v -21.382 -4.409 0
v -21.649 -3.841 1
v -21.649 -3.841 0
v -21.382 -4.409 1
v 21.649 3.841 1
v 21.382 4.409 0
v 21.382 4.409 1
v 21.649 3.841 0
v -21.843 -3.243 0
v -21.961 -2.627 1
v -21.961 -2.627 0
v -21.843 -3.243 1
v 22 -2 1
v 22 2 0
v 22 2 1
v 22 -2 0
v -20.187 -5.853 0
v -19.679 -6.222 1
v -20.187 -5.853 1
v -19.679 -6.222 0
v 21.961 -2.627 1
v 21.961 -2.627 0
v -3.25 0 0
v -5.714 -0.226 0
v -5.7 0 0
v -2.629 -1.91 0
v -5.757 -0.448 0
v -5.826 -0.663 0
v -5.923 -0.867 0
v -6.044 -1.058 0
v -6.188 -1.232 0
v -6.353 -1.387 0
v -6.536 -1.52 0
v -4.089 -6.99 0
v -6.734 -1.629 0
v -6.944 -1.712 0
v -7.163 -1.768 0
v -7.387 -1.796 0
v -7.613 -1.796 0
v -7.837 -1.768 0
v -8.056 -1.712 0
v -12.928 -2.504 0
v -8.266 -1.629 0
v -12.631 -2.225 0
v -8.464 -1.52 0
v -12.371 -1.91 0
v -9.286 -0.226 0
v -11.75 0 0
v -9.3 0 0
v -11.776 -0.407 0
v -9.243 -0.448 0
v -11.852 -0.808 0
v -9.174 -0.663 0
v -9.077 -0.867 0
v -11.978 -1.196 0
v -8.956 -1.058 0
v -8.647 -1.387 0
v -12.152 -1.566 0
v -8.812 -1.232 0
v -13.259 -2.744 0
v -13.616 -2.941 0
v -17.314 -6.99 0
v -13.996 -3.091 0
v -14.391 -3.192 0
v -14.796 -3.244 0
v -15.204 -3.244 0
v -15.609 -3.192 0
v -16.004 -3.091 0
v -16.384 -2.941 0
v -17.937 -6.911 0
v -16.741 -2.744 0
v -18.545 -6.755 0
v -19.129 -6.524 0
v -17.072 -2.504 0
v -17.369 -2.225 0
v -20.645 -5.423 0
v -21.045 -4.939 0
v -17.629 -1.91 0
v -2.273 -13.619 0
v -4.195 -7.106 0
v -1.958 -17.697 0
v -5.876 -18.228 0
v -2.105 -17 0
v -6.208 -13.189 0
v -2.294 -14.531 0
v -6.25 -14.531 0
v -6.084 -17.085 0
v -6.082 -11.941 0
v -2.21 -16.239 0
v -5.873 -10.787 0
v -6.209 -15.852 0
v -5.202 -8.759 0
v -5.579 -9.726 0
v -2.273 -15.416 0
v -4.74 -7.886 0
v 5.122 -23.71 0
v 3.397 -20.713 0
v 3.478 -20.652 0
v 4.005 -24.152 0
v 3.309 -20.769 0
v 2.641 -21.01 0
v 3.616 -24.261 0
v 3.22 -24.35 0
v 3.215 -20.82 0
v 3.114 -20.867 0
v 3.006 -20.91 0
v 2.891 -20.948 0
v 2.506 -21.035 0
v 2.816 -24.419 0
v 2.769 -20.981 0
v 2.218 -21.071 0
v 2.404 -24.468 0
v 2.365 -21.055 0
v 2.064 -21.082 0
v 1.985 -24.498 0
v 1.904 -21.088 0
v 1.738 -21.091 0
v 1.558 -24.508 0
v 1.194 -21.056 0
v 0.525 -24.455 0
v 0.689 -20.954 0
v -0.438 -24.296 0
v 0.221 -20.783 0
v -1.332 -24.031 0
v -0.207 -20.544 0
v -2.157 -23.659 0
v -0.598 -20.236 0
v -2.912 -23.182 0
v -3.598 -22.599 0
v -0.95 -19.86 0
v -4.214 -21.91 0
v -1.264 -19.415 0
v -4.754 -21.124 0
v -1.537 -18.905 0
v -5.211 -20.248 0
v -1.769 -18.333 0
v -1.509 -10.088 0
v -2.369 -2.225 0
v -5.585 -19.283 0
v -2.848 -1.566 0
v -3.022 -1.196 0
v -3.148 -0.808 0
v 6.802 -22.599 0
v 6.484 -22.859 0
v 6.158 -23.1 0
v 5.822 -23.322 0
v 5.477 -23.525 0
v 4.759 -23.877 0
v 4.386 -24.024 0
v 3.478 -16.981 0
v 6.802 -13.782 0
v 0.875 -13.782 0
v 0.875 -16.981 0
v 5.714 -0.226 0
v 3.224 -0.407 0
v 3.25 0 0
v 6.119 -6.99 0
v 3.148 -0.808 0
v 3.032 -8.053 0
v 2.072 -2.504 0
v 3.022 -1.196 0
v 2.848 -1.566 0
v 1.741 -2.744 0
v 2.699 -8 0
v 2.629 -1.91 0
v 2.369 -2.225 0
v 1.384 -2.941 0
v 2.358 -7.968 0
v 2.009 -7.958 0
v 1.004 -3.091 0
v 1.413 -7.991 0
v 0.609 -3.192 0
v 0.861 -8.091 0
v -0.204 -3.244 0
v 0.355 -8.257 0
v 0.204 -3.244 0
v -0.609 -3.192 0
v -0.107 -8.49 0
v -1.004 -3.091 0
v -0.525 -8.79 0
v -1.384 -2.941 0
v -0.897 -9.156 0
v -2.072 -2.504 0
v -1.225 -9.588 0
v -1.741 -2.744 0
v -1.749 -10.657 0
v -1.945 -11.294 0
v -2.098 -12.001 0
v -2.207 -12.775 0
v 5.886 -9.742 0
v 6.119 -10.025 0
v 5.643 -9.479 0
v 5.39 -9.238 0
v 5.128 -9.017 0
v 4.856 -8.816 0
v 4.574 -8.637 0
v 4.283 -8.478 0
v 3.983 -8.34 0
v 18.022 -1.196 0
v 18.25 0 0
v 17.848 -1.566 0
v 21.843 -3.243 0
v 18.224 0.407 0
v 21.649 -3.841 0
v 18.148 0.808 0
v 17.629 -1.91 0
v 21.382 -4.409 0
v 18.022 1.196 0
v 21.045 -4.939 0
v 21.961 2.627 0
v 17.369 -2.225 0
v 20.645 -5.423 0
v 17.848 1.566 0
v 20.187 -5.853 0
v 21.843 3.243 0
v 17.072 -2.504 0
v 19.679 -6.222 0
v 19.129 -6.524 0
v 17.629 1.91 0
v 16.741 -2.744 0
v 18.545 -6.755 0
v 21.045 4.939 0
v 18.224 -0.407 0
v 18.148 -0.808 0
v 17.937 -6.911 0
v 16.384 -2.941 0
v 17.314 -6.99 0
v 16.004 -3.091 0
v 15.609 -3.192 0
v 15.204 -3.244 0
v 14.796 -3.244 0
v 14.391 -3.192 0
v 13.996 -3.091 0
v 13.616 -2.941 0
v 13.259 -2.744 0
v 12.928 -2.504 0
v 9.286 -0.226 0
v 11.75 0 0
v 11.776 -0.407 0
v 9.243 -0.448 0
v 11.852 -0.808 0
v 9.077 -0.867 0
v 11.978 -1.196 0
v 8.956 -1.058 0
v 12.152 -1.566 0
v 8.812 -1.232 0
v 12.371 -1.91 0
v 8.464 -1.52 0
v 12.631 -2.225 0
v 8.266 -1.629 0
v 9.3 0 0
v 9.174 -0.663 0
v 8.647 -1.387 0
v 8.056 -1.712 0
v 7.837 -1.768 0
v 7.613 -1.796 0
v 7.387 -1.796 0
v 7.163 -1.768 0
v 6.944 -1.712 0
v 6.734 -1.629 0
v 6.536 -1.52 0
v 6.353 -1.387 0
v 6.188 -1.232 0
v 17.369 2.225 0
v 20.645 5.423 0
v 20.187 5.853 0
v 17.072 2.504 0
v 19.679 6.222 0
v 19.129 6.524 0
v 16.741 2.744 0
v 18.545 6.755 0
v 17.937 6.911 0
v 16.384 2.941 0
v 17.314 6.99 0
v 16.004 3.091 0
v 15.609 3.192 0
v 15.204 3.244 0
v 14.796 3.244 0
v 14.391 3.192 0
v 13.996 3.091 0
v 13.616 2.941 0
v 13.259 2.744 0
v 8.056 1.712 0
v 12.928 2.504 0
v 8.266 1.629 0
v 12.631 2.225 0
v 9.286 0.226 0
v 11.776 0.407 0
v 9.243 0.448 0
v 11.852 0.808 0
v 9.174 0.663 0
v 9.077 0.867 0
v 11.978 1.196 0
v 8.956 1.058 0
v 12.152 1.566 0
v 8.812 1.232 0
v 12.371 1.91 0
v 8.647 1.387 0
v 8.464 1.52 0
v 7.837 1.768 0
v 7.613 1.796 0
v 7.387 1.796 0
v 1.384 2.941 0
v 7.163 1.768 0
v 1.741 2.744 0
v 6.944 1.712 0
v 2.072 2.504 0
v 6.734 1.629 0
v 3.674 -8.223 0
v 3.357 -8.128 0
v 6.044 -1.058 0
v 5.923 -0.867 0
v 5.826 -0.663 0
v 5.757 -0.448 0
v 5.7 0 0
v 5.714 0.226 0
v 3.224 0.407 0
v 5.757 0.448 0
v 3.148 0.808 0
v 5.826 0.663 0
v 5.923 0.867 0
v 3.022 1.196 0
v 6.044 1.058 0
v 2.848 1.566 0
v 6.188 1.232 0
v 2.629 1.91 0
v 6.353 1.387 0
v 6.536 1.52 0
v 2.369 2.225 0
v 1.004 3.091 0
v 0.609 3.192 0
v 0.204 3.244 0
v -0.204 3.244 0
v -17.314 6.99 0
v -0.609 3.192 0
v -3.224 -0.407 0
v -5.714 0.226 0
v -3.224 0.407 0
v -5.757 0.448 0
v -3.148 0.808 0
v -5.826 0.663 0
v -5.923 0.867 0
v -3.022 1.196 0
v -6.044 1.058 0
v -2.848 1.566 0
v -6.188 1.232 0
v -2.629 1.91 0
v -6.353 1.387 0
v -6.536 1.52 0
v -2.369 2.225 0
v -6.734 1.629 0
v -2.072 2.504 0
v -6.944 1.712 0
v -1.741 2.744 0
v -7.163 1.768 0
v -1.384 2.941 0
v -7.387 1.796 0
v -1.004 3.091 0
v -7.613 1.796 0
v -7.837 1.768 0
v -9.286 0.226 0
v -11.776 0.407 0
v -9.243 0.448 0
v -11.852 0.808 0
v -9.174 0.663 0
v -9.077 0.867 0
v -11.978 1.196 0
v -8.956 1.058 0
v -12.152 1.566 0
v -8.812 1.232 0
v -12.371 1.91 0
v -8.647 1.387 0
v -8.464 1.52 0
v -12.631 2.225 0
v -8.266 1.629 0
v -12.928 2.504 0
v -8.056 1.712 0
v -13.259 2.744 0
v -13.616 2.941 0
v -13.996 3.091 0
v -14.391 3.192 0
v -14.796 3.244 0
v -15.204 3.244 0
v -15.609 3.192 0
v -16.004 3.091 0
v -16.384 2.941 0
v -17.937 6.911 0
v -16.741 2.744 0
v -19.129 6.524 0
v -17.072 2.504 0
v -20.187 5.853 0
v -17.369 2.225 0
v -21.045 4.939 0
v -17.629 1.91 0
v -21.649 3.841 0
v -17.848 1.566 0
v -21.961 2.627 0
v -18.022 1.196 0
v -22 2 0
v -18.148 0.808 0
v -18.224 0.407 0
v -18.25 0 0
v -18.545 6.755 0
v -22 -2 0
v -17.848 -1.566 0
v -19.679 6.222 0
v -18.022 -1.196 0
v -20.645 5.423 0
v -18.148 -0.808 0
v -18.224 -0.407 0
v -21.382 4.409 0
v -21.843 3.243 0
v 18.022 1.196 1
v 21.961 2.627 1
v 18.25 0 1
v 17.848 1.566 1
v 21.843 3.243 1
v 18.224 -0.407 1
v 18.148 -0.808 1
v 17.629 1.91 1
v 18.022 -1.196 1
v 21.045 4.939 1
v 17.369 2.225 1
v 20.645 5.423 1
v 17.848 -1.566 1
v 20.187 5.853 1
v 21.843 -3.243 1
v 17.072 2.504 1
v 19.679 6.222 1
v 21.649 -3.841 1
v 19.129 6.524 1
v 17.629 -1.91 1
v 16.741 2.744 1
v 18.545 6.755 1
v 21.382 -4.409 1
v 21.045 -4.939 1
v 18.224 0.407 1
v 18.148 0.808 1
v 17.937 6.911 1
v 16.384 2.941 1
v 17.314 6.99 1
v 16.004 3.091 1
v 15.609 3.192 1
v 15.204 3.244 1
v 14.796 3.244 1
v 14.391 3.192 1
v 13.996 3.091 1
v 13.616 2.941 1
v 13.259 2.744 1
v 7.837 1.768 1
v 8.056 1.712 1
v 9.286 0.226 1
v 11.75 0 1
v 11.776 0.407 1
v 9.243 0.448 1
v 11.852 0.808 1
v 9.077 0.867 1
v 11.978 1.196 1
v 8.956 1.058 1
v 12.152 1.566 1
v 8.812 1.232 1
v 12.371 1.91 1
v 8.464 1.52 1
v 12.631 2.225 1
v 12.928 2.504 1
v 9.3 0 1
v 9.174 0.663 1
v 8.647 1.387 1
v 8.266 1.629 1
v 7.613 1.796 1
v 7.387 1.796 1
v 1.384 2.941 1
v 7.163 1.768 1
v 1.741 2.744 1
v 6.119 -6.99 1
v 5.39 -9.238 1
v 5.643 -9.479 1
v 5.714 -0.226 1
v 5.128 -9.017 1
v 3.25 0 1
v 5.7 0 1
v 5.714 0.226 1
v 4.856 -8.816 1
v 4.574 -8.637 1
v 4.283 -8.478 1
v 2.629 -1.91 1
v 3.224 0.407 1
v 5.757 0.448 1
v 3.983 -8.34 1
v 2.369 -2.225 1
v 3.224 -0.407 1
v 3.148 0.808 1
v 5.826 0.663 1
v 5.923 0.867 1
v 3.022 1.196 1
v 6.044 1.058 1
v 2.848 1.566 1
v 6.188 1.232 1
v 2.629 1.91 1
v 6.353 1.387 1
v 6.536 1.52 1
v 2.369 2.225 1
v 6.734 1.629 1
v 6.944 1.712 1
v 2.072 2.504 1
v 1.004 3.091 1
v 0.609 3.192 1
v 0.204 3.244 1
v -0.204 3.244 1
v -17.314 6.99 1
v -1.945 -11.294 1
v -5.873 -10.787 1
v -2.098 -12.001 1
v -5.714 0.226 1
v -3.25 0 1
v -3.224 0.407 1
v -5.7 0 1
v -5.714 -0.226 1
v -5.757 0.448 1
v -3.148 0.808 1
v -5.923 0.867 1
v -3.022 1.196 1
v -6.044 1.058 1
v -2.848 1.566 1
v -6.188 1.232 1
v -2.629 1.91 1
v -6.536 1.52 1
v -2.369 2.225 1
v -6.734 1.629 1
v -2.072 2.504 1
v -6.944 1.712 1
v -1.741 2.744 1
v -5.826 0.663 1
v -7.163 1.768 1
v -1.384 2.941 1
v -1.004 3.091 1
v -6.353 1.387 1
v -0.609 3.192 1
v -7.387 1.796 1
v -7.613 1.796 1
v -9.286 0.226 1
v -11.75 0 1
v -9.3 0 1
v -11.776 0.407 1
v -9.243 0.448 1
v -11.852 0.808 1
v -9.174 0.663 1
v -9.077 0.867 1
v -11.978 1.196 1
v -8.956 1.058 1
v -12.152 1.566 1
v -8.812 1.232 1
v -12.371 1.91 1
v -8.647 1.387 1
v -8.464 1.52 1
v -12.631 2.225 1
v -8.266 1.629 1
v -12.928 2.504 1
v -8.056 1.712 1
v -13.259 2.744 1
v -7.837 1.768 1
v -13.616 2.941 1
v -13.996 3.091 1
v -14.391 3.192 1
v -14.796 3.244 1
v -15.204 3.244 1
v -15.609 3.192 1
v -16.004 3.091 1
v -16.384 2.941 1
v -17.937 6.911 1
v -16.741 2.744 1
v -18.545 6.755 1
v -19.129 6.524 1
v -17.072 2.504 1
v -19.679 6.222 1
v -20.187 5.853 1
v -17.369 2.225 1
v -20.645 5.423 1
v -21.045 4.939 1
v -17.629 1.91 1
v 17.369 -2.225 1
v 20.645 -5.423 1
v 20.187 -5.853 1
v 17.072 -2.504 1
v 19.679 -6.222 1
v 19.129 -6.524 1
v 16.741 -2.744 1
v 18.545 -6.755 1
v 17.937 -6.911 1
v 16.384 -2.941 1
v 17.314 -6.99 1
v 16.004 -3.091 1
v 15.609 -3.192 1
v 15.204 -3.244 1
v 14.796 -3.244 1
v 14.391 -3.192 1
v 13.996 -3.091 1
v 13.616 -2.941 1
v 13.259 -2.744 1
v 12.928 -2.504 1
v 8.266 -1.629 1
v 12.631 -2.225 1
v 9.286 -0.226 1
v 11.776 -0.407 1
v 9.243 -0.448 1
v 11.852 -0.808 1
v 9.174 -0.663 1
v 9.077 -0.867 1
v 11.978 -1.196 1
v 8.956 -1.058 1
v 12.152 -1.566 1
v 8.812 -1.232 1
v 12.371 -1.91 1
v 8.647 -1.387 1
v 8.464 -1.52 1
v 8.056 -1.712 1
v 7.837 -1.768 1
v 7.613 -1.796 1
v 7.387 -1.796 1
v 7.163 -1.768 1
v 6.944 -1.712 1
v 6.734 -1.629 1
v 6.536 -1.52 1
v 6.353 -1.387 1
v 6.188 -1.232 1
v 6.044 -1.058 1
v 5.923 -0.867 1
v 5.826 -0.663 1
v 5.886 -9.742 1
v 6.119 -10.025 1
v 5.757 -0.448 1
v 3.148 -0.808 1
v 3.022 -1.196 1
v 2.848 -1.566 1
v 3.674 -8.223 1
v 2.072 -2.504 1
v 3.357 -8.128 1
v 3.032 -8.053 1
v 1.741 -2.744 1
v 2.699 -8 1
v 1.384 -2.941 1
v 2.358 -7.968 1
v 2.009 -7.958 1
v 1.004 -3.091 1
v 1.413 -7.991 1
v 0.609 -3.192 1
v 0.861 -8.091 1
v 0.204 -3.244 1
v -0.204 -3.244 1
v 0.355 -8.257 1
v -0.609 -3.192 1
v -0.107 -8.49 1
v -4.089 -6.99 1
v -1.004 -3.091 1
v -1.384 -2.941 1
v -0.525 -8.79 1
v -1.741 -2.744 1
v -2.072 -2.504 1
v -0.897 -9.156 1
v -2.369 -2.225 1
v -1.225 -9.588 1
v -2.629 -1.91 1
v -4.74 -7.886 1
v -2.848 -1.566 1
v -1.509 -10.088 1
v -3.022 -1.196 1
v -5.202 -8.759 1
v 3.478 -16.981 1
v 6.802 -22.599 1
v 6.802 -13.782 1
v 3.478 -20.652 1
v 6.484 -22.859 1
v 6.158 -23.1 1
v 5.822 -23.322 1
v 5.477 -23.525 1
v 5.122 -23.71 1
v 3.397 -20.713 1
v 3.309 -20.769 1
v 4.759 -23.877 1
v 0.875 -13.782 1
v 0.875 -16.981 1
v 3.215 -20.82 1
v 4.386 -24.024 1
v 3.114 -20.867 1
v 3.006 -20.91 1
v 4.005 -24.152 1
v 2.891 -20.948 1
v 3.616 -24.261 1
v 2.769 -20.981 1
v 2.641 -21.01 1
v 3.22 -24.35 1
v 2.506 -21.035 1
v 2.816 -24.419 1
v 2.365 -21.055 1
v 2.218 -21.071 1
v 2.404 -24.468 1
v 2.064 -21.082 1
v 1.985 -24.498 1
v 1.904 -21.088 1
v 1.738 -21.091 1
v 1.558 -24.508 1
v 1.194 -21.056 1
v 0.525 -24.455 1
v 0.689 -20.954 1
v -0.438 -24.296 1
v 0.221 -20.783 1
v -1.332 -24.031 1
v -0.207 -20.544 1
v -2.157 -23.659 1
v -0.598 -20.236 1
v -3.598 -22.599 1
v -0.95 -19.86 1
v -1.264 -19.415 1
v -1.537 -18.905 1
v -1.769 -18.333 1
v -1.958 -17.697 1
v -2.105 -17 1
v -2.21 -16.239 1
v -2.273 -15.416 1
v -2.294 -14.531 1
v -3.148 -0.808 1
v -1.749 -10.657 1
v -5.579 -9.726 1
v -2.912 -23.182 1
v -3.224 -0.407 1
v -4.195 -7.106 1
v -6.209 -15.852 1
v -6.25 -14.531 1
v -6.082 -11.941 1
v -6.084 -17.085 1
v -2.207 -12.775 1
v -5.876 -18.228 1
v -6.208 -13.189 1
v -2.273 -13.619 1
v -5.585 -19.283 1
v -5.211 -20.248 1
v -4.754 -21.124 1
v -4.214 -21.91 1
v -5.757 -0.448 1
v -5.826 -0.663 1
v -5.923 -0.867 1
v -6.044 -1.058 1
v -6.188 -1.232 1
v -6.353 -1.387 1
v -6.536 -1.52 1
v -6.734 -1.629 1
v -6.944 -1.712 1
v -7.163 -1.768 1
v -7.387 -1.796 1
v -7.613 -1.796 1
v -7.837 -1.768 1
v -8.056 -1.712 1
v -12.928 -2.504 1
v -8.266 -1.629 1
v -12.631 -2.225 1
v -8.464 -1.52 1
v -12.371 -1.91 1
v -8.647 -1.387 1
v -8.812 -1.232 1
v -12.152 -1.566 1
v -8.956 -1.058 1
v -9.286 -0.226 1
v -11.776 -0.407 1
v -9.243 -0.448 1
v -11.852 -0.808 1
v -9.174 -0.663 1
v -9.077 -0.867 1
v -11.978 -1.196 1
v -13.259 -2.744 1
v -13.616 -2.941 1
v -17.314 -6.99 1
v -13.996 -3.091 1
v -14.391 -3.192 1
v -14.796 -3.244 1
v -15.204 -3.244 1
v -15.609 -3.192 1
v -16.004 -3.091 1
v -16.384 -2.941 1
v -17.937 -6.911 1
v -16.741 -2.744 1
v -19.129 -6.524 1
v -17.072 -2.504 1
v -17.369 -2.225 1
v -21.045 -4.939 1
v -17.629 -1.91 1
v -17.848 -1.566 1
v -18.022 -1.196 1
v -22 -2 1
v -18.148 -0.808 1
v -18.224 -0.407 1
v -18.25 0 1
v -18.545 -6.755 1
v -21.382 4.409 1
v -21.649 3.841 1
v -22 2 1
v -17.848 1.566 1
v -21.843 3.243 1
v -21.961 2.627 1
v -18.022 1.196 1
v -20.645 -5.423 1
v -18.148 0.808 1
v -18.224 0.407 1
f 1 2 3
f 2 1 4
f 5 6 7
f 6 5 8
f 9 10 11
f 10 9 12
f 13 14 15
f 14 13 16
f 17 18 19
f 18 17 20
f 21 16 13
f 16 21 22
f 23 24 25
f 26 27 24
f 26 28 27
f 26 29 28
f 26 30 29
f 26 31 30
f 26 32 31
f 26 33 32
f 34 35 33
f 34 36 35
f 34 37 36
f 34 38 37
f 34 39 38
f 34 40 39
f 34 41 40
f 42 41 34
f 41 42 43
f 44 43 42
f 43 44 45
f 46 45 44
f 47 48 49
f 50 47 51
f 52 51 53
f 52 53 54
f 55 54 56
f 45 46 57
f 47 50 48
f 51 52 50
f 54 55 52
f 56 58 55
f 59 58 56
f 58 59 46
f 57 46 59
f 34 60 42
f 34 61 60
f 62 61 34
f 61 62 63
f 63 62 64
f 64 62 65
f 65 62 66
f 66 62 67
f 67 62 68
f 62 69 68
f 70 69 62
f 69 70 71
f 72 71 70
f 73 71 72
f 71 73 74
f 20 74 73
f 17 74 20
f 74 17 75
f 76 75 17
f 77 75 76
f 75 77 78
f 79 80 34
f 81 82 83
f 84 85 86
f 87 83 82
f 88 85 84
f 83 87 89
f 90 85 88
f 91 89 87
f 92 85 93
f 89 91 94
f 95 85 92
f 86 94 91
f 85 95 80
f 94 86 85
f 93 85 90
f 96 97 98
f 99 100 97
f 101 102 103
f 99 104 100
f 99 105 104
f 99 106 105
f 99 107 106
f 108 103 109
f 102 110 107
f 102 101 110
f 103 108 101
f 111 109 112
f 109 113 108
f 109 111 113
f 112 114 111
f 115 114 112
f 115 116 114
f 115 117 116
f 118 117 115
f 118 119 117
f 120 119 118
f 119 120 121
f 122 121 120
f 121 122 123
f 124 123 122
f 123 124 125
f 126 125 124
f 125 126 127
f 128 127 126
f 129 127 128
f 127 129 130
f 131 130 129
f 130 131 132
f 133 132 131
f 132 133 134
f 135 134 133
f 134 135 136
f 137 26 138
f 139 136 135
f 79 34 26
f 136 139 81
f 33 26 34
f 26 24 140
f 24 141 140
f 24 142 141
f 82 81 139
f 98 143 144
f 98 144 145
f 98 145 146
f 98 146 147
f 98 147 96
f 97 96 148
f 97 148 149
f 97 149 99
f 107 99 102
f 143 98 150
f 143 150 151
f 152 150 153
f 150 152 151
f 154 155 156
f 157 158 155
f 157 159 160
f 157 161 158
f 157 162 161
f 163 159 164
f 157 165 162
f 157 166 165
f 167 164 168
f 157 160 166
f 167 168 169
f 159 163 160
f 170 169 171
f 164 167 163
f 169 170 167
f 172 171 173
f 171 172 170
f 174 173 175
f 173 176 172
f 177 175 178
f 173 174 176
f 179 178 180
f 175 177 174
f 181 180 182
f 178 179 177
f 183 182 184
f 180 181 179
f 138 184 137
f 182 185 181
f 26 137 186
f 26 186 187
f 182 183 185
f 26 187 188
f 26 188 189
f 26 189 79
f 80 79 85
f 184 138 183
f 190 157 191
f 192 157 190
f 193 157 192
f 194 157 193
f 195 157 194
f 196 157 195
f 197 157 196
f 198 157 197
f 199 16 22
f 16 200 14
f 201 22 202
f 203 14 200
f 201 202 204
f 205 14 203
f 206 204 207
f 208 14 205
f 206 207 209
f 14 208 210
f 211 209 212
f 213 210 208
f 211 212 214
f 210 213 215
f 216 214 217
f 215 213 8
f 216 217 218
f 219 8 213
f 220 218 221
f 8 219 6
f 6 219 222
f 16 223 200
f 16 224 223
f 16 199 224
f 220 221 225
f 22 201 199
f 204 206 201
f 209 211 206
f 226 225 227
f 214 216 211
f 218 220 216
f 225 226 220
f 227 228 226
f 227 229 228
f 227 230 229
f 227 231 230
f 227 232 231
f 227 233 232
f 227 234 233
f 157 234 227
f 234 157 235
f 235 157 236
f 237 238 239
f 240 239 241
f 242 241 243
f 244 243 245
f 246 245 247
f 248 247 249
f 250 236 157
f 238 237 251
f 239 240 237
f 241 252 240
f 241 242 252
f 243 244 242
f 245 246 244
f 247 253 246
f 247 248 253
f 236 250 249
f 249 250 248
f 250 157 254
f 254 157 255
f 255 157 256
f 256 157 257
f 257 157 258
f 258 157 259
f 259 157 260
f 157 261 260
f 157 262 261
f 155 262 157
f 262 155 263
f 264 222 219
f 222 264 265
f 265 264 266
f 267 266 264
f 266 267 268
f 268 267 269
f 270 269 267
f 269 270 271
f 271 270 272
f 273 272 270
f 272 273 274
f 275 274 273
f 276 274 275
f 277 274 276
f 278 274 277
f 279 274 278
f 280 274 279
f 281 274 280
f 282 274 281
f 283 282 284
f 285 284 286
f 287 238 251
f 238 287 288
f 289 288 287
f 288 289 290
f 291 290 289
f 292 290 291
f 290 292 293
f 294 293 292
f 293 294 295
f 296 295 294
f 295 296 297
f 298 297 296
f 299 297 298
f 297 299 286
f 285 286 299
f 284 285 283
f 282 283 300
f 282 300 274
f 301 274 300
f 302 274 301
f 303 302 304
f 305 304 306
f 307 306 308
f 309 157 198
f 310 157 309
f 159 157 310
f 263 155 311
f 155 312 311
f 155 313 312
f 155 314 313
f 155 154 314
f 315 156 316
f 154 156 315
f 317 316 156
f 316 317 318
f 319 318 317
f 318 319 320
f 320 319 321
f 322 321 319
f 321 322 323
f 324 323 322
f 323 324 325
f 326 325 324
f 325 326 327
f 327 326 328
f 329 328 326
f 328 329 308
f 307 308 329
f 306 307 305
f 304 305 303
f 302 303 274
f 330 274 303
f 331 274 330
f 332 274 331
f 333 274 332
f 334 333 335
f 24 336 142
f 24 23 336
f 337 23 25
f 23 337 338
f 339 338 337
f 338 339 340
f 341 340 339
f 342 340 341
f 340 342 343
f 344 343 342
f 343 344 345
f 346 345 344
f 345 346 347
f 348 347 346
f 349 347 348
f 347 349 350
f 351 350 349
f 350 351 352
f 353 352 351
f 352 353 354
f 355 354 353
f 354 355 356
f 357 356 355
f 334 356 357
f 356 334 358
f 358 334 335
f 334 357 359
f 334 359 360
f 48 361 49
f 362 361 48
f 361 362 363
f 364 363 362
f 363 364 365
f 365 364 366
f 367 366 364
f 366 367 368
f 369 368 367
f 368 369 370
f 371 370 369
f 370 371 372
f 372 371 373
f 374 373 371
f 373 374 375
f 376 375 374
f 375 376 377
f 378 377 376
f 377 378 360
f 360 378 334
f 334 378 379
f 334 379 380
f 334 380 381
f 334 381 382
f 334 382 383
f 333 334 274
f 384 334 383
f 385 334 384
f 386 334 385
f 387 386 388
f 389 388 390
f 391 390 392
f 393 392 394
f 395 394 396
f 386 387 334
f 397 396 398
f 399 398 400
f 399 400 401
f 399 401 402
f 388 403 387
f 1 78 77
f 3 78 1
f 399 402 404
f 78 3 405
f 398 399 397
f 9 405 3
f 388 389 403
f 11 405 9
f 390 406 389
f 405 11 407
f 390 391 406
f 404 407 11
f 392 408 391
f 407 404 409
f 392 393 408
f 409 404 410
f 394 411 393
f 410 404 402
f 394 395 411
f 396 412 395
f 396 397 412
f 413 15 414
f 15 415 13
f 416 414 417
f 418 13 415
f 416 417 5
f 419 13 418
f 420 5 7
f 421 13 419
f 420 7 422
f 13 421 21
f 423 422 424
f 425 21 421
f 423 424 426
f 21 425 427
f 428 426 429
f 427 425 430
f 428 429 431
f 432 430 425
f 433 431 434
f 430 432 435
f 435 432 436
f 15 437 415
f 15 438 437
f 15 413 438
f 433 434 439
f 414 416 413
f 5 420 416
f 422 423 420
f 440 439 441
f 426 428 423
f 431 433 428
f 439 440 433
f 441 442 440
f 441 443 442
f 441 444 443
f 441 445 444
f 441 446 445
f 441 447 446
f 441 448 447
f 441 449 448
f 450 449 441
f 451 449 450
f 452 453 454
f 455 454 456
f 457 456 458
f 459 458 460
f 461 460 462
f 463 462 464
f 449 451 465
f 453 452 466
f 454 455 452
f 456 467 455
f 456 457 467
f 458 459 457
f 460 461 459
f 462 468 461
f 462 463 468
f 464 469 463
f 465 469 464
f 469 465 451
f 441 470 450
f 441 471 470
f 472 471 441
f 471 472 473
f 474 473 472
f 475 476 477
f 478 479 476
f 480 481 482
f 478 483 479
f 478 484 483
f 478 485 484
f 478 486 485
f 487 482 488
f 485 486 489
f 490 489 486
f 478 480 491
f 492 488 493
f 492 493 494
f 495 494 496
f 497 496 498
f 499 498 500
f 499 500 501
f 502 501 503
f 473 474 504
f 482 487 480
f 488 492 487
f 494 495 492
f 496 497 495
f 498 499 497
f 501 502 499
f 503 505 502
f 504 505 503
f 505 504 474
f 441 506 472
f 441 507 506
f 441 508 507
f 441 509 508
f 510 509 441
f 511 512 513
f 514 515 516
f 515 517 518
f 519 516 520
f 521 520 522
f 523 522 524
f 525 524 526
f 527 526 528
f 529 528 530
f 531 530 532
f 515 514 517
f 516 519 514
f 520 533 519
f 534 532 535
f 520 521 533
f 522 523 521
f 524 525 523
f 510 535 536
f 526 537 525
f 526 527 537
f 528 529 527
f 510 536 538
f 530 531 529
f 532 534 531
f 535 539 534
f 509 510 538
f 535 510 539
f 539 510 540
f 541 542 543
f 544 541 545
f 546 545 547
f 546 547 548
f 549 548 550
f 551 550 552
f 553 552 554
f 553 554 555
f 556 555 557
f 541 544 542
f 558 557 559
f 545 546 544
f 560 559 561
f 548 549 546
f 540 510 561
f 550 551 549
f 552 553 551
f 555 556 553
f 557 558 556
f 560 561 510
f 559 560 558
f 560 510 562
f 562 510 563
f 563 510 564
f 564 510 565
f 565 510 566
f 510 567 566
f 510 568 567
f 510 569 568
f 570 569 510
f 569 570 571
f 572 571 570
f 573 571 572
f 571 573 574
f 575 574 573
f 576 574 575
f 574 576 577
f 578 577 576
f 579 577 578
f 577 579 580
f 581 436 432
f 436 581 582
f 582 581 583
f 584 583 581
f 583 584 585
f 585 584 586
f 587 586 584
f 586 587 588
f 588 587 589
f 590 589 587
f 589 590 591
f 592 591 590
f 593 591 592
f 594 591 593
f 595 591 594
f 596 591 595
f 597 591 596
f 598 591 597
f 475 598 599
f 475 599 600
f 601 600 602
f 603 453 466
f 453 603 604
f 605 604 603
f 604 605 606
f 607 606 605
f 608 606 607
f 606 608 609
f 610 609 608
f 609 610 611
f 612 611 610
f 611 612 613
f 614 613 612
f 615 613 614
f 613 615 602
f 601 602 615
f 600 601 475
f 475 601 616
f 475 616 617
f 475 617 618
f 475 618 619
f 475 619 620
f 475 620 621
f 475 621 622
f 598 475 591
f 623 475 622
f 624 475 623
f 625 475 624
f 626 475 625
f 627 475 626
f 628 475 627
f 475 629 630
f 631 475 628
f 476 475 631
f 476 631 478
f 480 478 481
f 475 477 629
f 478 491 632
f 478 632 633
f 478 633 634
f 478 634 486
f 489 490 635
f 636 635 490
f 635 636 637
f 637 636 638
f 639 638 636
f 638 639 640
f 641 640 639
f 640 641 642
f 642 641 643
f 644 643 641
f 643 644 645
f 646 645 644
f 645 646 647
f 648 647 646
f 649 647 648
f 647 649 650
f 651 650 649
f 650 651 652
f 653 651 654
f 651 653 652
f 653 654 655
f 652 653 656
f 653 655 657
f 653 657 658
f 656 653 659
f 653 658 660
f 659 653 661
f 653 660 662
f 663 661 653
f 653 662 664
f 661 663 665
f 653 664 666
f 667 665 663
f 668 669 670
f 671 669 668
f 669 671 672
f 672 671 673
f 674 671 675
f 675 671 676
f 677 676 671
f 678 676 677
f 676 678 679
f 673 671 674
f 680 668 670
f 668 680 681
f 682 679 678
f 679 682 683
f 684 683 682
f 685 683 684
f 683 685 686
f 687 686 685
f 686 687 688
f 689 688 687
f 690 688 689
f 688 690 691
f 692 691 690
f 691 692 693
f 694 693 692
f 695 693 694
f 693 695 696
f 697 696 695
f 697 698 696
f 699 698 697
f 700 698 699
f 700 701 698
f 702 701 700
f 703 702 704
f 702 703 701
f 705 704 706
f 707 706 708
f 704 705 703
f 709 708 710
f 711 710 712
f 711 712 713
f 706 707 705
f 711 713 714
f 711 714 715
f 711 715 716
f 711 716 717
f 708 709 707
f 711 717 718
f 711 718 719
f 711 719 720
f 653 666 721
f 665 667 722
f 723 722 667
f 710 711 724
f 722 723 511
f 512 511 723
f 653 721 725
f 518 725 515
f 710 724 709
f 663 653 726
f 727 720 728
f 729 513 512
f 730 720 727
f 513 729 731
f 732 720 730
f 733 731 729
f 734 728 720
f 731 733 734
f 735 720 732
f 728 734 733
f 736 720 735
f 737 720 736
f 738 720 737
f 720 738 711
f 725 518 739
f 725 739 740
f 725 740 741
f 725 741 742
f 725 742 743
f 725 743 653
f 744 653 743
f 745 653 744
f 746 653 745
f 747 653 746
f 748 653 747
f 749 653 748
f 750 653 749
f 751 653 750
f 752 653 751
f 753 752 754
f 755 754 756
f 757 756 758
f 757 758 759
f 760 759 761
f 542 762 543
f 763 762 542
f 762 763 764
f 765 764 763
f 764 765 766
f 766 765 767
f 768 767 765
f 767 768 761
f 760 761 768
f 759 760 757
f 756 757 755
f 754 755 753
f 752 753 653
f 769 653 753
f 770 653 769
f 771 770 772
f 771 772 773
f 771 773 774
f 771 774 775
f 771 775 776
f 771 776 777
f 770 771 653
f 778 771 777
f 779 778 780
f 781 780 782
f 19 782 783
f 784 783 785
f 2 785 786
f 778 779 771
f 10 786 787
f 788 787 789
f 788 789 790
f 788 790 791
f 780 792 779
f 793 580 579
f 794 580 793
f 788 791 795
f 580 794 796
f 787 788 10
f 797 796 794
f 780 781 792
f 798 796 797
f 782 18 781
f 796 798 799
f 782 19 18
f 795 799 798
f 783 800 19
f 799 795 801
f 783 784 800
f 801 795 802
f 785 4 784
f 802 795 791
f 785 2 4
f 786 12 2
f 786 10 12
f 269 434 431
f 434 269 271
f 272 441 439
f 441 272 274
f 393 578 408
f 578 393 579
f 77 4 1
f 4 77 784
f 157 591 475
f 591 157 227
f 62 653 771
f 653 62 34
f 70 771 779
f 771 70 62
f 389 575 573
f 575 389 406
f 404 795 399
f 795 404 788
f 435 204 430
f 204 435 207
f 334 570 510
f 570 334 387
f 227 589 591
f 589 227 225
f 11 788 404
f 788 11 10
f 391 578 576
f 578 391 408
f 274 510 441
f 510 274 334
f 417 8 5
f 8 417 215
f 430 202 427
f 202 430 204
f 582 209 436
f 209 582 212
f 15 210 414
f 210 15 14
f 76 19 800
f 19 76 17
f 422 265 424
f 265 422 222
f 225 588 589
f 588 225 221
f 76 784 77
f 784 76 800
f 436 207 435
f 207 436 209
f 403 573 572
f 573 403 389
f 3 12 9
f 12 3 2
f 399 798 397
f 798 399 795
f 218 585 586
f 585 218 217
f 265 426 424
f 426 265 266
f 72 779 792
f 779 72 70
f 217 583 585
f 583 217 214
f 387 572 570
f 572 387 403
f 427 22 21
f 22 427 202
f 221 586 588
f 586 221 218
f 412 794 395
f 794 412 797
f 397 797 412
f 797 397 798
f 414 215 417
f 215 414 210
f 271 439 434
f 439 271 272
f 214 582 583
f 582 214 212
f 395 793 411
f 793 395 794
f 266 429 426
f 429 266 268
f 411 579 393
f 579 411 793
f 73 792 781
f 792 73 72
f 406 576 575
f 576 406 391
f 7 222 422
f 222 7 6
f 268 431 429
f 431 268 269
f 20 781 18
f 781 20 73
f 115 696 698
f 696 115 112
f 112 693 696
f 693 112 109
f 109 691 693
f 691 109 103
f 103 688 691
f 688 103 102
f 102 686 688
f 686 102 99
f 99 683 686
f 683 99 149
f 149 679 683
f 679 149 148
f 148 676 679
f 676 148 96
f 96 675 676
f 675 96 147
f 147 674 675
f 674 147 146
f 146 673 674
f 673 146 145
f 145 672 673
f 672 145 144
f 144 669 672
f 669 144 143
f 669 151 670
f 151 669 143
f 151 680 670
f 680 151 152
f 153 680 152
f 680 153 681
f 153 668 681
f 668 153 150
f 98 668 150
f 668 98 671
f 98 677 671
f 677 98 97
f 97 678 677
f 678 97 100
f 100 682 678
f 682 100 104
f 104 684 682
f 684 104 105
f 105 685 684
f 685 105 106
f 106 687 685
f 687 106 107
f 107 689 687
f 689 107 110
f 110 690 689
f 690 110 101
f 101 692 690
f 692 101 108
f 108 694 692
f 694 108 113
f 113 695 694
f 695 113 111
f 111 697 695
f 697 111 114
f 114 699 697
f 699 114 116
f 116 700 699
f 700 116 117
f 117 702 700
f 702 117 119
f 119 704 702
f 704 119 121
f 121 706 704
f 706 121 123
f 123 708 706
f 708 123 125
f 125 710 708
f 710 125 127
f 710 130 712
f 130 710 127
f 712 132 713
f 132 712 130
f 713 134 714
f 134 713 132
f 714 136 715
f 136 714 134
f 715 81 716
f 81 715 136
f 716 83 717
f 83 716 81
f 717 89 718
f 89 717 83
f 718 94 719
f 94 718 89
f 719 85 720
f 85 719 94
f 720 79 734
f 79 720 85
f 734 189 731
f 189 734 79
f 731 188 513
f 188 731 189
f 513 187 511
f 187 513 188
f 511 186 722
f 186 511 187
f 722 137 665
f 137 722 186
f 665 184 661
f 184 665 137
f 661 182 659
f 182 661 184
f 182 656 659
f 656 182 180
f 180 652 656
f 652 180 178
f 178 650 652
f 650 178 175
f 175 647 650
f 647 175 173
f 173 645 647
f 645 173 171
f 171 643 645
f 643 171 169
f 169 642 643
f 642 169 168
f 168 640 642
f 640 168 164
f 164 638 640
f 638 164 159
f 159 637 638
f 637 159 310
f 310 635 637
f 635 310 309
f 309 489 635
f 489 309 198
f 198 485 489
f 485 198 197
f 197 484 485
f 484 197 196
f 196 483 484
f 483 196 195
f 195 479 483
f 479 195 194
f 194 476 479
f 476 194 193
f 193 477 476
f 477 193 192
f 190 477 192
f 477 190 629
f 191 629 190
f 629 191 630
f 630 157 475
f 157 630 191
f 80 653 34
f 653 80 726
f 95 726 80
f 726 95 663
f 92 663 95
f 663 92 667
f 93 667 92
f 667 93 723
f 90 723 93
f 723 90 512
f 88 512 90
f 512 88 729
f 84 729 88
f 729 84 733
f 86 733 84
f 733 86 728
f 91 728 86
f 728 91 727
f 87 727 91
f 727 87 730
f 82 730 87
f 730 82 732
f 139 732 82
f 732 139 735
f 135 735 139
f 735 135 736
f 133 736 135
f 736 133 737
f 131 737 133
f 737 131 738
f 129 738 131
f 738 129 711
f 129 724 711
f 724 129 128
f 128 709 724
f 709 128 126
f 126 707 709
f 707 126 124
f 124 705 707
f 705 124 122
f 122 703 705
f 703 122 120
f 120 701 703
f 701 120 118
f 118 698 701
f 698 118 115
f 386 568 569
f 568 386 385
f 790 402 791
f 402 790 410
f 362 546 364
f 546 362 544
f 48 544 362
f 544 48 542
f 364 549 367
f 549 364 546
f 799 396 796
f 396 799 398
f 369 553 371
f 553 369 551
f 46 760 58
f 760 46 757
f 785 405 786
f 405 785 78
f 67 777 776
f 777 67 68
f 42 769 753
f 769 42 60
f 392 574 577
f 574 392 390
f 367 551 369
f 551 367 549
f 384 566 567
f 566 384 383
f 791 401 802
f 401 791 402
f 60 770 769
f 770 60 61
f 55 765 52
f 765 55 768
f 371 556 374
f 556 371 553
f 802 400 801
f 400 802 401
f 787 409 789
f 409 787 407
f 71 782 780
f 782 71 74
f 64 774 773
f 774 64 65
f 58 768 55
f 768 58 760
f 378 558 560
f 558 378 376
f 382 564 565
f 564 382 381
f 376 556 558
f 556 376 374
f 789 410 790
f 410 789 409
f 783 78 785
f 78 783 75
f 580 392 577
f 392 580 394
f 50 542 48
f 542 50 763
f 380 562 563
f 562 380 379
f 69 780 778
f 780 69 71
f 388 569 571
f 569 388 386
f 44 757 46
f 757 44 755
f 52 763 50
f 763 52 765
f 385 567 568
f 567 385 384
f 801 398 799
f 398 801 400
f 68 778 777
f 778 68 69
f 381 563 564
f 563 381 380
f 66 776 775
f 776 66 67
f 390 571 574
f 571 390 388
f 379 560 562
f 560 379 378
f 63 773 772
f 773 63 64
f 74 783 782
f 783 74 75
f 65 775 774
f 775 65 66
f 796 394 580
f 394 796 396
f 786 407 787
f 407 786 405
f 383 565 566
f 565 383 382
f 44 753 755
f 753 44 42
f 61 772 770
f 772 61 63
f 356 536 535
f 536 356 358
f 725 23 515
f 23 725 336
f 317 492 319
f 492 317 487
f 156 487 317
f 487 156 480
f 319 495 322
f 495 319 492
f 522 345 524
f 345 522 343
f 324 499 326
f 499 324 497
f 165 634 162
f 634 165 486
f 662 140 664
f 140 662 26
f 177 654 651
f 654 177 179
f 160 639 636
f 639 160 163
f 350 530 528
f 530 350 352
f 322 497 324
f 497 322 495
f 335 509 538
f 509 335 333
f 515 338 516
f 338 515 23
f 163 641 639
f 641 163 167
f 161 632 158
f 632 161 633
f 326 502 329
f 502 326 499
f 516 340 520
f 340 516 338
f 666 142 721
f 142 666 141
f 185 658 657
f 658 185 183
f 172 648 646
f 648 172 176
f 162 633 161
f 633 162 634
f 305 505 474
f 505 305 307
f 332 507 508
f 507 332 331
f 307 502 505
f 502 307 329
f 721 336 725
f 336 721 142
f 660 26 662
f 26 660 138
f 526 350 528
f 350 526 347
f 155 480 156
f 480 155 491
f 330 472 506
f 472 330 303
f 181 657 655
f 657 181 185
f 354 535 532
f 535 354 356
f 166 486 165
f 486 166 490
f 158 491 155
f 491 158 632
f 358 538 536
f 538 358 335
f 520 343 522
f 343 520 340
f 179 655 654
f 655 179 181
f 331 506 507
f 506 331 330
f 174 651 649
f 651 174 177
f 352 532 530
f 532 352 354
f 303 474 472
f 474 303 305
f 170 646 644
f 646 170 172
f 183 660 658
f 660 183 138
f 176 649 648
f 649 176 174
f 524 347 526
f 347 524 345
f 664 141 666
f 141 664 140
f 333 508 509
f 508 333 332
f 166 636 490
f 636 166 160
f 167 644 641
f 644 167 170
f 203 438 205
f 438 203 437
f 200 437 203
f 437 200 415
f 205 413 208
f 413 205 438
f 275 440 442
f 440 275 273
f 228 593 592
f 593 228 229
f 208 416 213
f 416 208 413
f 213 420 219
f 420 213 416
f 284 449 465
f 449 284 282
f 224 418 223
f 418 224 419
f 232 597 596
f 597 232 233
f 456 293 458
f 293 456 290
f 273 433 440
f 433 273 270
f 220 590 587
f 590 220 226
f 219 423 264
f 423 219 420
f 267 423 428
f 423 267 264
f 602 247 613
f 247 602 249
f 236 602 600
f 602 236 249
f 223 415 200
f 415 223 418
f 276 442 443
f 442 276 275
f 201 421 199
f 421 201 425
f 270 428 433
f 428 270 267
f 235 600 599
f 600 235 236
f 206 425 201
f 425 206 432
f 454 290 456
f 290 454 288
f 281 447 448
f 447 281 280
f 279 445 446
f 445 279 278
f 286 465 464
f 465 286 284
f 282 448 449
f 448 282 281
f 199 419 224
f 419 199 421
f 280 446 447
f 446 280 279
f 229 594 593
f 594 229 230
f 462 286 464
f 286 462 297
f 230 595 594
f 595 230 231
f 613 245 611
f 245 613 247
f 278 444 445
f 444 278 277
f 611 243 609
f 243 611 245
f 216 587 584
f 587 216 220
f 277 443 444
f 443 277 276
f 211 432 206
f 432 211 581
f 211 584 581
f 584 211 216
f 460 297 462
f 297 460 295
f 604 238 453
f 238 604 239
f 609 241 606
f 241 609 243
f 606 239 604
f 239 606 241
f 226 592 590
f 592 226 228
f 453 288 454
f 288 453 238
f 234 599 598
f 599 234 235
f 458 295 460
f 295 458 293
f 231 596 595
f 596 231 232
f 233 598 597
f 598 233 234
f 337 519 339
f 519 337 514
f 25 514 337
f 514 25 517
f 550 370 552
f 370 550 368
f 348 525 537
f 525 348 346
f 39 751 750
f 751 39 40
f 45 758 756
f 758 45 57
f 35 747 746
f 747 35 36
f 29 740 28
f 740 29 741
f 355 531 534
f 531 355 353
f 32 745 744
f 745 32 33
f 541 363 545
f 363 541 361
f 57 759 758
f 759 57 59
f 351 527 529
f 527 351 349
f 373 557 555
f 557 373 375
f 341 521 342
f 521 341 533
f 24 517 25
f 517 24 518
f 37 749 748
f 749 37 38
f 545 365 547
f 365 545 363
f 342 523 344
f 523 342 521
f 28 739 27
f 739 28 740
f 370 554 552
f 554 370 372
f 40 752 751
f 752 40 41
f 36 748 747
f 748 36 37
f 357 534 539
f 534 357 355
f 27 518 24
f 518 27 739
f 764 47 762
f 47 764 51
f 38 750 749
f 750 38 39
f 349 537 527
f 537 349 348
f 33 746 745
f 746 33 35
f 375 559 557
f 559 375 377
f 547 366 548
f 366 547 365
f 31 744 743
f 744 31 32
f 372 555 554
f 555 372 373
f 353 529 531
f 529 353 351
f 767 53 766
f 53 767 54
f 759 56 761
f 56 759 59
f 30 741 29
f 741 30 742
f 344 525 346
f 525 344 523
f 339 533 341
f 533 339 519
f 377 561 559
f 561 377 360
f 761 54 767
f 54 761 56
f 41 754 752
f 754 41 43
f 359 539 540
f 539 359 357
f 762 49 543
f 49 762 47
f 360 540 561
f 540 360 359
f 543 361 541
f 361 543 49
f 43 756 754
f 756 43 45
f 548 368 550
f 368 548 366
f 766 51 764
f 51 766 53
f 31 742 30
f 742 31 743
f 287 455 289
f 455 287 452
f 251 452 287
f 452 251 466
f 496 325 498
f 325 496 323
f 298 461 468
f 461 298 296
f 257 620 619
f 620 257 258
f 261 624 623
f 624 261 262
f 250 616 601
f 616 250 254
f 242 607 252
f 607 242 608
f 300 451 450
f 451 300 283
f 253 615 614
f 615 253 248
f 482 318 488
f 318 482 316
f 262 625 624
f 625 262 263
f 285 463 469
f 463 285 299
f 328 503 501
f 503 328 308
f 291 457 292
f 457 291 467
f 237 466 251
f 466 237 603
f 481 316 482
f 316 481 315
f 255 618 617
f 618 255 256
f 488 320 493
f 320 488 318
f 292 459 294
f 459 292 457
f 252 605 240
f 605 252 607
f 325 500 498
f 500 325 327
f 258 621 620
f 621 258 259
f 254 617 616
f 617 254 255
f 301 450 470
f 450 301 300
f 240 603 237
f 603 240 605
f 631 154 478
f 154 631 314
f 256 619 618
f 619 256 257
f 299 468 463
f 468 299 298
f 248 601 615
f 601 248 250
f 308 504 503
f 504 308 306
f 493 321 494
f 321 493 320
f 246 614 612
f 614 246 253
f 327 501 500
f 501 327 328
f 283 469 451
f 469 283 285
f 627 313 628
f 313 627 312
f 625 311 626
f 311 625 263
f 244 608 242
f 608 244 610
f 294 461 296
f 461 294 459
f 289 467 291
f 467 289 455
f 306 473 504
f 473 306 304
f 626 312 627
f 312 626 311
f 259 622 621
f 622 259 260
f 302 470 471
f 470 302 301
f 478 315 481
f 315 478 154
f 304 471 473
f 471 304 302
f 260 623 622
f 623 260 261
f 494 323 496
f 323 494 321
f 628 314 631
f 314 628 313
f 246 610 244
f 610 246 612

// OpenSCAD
$fn = 50;


difference() {
	union() {
		hull() {
			translate(v = [-17.0000000000, 2.0000000000, 0]) {
				cylinder(h = 1, r = 5);
			}
			translate(v = [17.0000000000, 2.0000000000, 0]) {
				cylinder(h = 1, r = 5);
			}
			translate(v = [-17.0000000000, -2.0000000000, 0]) {
				cylinder(h = 1, r = 5);
			}
			translate(v = [17.0000000000, -2.0000000000, 0]) {
				cylinder(h = 1, r = 5);
			}
		}
		translate(v = [0, -5, 0]) {
			linear_extrude(height = 1) {
				text(font = "DejaVu Sans Mono:style=Bold", halign = "center", size = 19.0000000000, text = "G", valign = "top");
			}
		}
	}
	union() {
		translate(v = [-15.0000000000, 0.0000000000, 0]) {
			translate(v = [0, 0, -100]) {
				cylinder(h = 200, r = 3.2500000000);
			}
		}
		translate(v = [0, 0, -100]) {
			cylinder(h = 200, r = 3.2500000000);
		}
		translate(v = [15.0000000000, 0.0000000000, 0]) {
			translate(v = [0, 0, -100]) {
				cylinder(h = 200, r = 3.2500000000);
			}
		}
		translate(v = [-15.0000000000, 0.0000000000, 0]) {
			translate(v = [0, 0, -100]) {
				cylinder(h = 200, r = 1.8000000000);
			}
		}
		translate(v = [-7.5000000000, 0.0000000000, 0]) {
			translate(v = [0, 0, -100]) {
				cylinder(h = 200, r = 1.8000000000);
			}
		}
		translate(v = [0, 0, -100]) {
			cylinder(h = 200, r = 1.8000000000);
		}
		translate(v = [7.5000000000, 0.0000000000, 0]) {
			translate(v = [0, 0, -100]) {
				cylinder(h = 200, r = 1.8000000000);
			}
		}
		translate(v = [15.0000000000, 0.0000000000, 0]) {
			translate(v = [0, 0, -100]) {
				cylinder(h = 200, r = 1.8000000000);
			}
		}
	}
}
